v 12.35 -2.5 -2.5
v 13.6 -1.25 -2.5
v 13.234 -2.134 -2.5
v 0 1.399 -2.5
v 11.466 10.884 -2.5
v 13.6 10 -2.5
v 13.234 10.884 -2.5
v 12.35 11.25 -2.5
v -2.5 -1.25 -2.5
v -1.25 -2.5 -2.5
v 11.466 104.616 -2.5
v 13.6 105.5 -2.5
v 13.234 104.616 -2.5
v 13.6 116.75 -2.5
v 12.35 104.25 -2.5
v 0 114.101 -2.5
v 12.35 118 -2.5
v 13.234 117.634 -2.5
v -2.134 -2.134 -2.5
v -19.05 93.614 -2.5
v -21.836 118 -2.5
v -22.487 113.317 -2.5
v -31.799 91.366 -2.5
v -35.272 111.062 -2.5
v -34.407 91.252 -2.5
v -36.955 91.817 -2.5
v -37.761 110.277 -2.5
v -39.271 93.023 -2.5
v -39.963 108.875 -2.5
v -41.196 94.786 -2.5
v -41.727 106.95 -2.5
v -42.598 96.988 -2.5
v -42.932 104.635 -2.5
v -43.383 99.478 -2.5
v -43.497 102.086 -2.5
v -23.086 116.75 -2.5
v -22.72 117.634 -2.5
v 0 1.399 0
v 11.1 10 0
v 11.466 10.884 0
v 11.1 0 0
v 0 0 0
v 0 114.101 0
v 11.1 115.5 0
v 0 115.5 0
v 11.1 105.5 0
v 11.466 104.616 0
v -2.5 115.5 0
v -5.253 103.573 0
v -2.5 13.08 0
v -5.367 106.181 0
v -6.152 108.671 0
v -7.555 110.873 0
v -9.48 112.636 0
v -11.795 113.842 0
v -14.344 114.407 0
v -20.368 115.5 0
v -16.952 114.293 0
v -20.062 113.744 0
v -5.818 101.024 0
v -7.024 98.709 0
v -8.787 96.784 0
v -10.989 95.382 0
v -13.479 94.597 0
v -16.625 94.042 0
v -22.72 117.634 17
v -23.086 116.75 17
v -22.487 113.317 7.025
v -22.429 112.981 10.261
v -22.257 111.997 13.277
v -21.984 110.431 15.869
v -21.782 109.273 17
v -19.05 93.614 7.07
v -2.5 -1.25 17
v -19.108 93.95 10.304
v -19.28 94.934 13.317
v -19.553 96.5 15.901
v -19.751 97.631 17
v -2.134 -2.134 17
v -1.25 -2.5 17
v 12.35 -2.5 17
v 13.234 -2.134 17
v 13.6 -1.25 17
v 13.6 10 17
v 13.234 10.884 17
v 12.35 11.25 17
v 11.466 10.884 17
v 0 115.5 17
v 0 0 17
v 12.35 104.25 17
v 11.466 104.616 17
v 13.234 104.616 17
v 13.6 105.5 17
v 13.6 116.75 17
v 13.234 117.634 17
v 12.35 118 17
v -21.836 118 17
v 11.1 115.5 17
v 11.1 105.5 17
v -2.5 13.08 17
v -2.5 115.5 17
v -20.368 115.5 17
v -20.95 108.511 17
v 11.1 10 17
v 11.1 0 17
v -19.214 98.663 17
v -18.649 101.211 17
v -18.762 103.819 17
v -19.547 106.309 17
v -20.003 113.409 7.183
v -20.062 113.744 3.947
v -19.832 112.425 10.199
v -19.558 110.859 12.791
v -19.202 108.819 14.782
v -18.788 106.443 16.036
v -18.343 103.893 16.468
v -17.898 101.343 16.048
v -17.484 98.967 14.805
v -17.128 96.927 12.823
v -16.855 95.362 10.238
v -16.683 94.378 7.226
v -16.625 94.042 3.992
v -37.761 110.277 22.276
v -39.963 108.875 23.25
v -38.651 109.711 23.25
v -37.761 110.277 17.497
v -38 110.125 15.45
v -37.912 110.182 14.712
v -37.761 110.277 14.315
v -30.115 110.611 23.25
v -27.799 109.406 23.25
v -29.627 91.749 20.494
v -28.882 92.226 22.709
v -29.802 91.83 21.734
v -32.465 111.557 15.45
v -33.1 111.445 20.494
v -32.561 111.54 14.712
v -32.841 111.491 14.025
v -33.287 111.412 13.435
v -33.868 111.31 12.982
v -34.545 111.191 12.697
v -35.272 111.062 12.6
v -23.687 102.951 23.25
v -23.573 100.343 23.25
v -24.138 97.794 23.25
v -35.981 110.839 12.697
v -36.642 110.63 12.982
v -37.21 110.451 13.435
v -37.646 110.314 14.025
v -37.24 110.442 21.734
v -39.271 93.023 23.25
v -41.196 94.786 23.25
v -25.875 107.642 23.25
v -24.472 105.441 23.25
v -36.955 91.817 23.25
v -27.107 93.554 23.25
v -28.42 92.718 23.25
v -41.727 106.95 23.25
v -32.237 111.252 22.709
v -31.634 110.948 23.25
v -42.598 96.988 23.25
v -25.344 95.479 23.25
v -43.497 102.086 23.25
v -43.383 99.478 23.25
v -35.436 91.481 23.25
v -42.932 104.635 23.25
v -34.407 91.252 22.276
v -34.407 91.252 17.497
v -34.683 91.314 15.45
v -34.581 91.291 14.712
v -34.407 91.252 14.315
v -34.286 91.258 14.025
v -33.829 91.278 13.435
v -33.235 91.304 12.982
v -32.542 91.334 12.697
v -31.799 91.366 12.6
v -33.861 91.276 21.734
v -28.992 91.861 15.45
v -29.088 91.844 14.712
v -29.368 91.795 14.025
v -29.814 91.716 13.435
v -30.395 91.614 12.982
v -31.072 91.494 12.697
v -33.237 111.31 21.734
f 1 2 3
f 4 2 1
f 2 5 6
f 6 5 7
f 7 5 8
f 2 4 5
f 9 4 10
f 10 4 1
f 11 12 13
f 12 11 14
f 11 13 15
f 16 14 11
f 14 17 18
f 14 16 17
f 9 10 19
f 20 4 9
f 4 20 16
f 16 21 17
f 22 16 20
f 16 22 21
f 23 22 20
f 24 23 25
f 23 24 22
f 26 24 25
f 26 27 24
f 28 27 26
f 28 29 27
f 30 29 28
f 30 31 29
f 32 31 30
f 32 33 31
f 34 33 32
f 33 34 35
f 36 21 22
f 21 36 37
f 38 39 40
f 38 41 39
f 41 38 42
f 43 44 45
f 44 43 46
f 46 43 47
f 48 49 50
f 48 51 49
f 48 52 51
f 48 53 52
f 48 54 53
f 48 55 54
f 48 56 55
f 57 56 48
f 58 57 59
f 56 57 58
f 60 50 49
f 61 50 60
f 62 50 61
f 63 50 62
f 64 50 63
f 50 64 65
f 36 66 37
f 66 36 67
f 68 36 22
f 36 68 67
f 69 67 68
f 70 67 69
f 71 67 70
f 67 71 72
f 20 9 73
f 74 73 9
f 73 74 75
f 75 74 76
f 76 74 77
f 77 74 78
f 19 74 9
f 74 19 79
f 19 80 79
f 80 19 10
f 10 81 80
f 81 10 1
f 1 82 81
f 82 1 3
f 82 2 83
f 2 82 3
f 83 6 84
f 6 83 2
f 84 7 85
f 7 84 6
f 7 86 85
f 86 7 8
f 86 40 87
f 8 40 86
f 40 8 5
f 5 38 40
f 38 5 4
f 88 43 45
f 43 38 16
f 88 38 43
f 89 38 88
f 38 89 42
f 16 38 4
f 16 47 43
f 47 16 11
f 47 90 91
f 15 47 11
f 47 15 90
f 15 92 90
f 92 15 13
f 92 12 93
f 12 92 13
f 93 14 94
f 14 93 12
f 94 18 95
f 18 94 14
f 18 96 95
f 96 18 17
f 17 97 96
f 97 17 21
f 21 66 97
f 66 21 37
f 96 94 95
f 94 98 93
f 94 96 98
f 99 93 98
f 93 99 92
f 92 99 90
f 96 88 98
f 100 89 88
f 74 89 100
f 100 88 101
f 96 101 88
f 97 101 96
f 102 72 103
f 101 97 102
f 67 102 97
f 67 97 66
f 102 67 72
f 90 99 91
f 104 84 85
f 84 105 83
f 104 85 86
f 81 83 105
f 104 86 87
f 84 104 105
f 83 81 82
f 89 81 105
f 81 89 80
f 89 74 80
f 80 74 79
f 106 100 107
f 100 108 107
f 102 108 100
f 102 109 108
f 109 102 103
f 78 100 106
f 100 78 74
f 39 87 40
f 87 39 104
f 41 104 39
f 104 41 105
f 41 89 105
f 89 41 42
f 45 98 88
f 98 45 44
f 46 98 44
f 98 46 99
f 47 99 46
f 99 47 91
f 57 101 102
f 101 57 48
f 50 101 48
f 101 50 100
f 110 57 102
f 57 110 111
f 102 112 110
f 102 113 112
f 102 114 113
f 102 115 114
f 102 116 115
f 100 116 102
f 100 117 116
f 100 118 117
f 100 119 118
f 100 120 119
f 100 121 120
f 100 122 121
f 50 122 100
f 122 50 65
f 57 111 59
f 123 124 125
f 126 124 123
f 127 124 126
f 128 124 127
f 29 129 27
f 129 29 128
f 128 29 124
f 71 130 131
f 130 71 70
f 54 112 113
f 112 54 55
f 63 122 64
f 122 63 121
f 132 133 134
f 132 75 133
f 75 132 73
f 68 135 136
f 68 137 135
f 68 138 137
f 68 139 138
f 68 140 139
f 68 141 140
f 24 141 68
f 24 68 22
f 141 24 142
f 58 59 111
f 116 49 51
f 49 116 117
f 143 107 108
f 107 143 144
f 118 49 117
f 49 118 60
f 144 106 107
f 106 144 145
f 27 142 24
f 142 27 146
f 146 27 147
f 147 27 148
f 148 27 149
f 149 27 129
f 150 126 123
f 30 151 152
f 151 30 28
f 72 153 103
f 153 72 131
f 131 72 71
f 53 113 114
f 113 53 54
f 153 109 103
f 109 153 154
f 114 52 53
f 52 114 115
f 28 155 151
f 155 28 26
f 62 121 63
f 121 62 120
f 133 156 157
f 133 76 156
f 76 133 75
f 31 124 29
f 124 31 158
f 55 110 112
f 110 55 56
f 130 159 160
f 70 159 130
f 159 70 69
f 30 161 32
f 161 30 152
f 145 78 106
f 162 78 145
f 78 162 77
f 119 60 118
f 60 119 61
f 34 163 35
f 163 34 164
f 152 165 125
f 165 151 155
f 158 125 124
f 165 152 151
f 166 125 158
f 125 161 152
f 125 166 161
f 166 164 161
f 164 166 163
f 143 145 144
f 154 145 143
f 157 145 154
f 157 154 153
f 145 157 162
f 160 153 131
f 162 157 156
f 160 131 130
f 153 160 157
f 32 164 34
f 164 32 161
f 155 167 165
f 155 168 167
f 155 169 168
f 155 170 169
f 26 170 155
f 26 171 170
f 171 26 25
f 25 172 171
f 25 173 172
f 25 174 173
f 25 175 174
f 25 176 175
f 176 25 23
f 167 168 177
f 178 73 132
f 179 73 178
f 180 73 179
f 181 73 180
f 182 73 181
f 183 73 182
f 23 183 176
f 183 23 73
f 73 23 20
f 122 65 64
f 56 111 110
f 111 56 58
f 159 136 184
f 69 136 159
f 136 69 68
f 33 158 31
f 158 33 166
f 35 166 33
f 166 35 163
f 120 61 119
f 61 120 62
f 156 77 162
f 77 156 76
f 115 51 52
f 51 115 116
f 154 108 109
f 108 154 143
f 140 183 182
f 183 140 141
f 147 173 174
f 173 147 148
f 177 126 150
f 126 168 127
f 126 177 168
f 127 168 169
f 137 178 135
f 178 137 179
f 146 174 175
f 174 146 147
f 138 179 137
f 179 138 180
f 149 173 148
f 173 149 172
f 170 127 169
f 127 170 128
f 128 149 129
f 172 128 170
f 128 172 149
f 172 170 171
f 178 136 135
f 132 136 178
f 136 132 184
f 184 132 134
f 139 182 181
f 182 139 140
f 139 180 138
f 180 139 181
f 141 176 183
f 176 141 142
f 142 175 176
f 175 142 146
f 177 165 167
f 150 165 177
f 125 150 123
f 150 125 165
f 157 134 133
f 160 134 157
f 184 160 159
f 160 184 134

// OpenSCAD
// file: ribbon.scad
module ribbon(points, thickness=1, closed=false) {
    p = closed ? concat(points, [points[0]]) : points;
    
    union() {
        for (i=[1:len(p)-1]) {
            hull() {
                translate(p[i-1]) 
                    if ($children==0)
                        circle(d=thickness, $fn=8);
                    else
                        children();
                translate(p[i]) 
                    if ($children==0)
                        circle(d=thickness, $fn=8);
                    else
                        children();
            }
        }
    }
}

pi = 3.1415926535897932;
function SIN(theta) = sin(theta * 180 / pi);
function COS(theta) = cos(theta * 180 / pi);
function TAN(theta) = tan(theta * 180 / pi);

//<skip>
color("red") linear_extrude(height=10)
 ribbon([for (theta=[0:0.1:2*pi]) [theta * 10 / (2*pi), SIN(theta) * 10 / (2*pi)]], thickness=3, height=10, closed=true);
color("blue") linear_extrude(height=10)
 ribbon([for (theta=[0:0.1:2*pi]) [theta * 10 / (2*pi), SIN(theta) * 10 / (2*pi)]], thickness=.1, height=10, closed=true);
ribbon([for (theta=[0:0.1:2*pi+.1]) [COS(theta)*10, SIN(3*theta) * 10]], thickness=.5);
//</skip>
    
// main file
use <ribbon.scad>;

wireDiameter = 5.2;
tabletHolderVertical = 10;
tabletHolderHorizontal = 17;
tabletEdgeToWire = 12.85;
tabletThicknessNominal = 10.6;
tabletHeightNominal = 115;
wireBelowPlane = 8;
wireHolderDiameter = 20;
wall = 2.5;
tolerance = 0.25;

angle = 10;

module dummy() {}

nudge = 0.001;
tabletThickness = tabletThicknessNominal + 2*tolerance;
tabletHeight = tabletHeightNominal + 2*tolerance;

module basicHolder2D(filled=false) {
    holderPoints = [
    [tabletThickness+wall/2,tabletHolderVertical],
    [tabletThickness+wall/2,-wall/2],
    [-wall/2,-wall/2],
    [-wall/2,tabletHeight+wall/2],
    [tabletThickness+wall/2,tabletHeight+wall/2],
    [tabletThickness+wall/2,tabletHeight-tabletHolderVertical]];
    ribbon(holderPoints, thickness=wall);
    if (filled) {
       hull() ribbon([for (i=[0:2]) holderPoints[i]],thickness=wall,closed=true);
       hull() ribbon([for (i=[len(holderPoints)-3:len(holderPoints)-1]) holderPoints[i]],thickness=wall,closed=true);
    }
    triangle = [[-wall/2,-wall/2], [-wall/2,tabletHeight+wall/2], [-wall/2-(tabletHeight+wall/2)*tan(angle), tabletHeight+wall/2]];
    if (filled)
        hull() ribbon(triangle, thickness=wall, closed=true);
    else
        ribbon(triangle, thickness=wall, closed=true);
    
}

module basicHolder() {
    translate([0,0,-wall]) {
        linear_extrude(height=wall)
            basicHolder2D(filled=true);    linear_extrude(height=wall+tabletHolderHorizontal)
            basicHolder2D(filled=false);
    }
}

module wireHolder() {
    $fn = 24;
    y = (tabletHeight-wireHolderDiameter/2);
    rotate([0,0,angle])
    translate([-tabletEdgeToWire-wireDiameter/2,y,0])
    render(convexity=4)
    difference() {
        translate([0,0,-wall])
        hull() {
            cylinder(h=wall+tabletEdgeToWire+2*wireDiameter,d=wireHolderDiameter); 
            translate([y*tan(angle),0,0]) cylinder(h=wall,d=wireHolderDiameter);
        }
        hull() {
            translate([0,0,tabletEdgeToWire+wireDiameter/2])
            rotate([-90,0,0])
            translate([0,0,-tabletHeight])
            cylinder(h=tabletHeight*3,d=wireDiameter+2*tolerance);
            translate([0,0,tabletEdgeToWire+wireDiameter*2])
            rotate([-90,0,0])
            translate([0,0,-tabletHeight])
            cylinder(h=tabletHeight*3,d=(wireDiameter+2*tolerance)*.65);
        }
        translate([0,0,tabletEdgeToWire+wireDiameter*2])
        rotate([-90,0,0])
        translate([0,0,-tabletHeight])
        cylinder(h=tabletHeight*3,d=(wireDiameter+2*tolerance)*1.25,$fn=4);
    }
}

basicHolder();
wireHolder();
